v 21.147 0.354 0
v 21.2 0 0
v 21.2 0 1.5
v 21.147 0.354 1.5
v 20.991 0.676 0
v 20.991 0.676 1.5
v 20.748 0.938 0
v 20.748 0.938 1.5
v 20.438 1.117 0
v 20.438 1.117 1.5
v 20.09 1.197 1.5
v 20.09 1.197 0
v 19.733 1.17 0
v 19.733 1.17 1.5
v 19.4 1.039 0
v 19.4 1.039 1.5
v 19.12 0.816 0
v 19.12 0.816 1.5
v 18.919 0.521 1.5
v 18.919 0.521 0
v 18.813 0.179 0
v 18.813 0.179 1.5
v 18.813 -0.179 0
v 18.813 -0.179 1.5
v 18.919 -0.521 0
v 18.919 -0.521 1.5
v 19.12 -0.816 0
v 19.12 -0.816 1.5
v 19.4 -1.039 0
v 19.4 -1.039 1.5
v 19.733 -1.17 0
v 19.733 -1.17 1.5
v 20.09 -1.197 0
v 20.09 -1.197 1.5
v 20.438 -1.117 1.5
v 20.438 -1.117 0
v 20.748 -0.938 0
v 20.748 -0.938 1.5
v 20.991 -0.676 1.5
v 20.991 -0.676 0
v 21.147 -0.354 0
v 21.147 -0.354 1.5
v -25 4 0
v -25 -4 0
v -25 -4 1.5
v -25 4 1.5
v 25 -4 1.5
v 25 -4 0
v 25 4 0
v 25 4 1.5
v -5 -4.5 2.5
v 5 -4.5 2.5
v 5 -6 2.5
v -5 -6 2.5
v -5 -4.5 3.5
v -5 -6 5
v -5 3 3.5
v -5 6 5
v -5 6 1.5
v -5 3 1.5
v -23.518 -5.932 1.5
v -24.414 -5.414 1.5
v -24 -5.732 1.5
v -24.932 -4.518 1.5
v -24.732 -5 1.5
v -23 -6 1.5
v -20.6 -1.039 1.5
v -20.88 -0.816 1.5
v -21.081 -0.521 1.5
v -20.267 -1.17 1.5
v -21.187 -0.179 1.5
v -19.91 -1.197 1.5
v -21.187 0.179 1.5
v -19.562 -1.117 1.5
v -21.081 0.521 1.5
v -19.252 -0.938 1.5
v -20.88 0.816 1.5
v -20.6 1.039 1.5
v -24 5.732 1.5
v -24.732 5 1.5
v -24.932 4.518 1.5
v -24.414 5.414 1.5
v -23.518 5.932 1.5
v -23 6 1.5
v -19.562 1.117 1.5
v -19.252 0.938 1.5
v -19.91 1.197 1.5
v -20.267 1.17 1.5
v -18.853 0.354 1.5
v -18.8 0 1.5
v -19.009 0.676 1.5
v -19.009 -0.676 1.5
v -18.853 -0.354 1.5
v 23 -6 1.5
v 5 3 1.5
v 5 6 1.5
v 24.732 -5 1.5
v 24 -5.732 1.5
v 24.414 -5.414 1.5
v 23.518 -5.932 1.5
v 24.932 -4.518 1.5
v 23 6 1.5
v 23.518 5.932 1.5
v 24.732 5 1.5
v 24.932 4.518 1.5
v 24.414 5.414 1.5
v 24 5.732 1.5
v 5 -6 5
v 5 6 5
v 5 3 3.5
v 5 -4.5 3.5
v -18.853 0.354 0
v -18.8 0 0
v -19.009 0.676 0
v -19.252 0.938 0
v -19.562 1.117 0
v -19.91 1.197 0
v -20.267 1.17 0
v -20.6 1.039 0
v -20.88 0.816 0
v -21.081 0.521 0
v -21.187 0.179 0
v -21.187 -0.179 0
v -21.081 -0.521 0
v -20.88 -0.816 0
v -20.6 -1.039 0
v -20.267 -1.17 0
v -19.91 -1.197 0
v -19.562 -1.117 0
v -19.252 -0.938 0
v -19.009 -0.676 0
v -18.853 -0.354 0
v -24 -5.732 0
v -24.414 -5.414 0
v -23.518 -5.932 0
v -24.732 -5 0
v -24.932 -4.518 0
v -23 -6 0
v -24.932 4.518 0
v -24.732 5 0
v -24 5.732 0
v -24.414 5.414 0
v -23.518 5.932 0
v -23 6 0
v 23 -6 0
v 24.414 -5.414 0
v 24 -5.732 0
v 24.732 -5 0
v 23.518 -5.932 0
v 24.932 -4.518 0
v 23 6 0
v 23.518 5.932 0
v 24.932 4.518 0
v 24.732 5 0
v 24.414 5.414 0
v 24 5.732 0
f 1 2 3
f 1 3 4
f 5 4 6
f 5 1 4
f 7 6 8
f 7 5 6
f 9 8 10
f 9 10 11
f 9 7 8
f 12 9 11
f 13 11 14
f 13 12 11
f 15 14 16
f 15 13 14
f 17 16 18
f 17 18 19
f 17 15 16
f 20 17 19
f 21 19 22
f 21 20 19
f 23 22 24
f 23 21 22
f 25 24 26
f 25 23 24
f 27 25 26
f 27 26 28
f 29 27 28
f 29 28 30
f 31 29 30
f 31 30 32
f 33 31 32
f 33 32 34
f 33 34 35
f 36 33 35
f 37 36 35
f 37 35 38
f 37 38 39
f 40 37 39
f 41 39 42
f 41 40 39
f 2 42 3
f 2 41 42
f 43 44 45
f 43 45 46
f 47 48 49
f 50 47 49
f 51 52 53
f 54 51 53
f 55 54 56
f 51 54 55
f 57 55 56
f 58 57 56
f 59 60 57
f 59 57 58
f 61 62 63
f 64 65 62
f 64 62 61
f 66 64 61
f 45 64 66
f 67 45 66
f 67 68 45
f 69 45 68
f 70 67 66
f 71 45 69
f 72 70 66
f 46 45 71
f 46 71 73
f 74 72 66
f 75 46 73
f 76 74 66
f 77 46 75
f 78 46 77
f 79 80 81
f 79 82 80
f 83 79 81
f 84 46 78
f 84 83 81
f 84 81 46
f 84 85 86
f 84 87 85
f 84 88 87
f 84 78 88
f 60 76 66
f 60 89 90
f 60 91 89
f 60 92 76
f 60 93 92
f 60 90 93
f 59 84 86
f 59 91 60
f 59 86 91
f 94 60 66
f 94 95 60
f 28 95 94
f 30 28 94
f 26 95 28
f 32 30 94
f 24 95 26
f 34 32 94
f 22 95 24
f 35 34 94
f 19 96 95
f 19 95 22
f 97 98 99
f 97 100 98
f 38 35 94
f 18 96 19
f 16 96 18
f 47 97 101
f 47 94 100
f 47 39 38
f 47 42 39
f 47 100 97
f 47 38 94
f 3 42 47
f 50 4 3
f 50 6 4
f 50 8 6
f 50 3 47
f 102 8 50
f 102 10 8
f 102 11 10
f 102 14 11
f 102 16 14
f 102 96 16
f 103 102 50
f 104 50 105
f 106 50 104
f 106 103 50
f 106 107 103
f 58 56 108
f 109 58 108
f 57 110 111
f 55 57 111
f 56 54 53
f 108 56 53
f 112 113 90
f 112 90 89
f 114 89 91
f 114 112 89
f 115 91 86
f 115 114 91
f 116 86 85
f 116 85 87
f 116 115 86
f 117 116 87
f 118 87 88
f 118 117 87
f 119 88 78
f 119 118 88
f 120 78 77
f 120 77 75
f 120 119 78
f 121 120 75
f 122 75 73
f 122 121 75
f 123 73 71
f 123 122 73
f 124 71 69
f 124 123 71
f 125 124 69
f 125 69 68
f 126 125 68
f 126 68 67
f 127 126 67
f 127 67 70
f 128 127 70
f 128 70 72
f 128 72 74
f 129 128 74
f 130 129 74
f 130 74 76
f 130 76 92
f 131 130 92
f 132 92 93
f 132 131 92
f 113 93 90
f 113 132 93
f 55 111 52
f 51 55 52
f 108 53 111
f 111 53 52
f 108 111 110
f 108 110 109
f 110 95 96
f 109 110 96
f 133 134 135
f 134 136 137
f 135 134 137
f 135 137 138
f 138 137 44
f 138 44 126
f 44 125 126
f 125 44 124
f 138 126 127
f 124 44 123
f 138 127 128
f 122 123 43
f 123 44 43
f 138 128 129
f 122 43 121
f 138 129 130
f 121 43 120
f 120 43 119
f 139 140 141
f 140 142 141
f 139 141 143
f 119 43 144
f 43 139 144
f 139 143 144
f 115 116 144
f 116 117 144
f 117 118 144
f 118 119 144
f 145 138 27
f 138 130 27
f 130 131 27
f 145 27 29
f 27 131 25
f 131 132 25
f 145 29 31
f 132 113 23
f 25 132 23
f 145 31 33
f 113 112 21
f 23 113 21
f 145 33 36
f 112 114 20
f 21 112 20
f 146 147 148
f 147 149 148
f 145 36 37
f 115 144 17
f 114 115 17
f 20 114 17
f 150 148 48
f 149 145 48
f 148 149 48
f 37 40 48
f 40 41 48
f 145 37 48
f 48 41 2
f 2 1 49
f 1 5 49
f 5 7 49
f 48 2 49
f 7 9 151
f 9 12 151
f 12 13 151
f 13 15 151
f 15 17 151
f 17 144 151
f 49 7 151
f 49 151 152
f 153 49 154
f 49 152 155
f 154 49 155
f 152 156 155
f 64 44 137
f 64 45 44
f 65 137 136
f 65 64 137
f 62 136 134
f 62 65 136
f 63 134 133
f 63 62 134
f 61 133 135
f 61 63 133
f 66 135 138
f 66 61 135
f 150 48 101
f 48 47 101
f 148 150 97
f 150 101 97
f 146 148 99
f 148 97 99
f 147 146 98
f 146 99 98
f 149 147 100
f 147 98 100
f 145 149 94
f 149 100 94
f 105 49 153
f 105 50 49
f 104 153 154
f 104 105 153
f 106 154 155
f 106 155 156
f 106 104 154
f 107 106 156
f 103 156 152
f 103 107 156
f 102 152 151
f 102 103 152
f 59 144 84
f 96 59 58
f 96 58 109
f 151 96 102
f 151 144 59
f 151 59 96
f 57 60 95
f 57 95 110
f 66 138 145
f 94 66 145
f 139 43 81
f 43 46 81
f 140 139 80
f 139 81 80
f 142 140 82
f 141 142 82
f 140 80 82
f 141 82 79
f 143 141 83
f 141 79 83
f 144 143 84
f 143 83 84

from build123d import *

# Parameters (mm, degrees)
SKETCH_W     = 50
SKETCH_H     = 12
SKETCH_R     = 1.2
PAD_DEPTH    = 1.5
SKETCH001_W  = 10
SKETCH001_H  = 12
PAD001_DEPTH = 3.5
POCKET_DEPTH = 10
FILLET_R     = 2


with BuildPart() as part:
    # Sketch → Pad (new body)
    with BuildSketch(Plane.XY):
        Rectangle(SKETCH_W, SKETCH_H)
        with Locations((-20, 0)):
            Circle(SKETCH_R, mode=Mode.SUBTRACT)
        with Locations((20, 0)):
            Circle(SKETCH_R, mode=Mode.SUBTRACT)
    extrude(amount=PAD_DEPTH)

    # Sketch001 (on Face8 of Pad) → Pad001 (join)
    with BuildSketch(Plane.XY.offset(1.5)):
        Rectangle(SKETCH001_W, SKETCH001_H)
    extrude(amount=PAD001_DEPTH)

    # Sketch002 (on Face12 of Pad001) → Pocket (cut)
    with BuildSketch(Plane.YZ.offset(5)):
        Polygon((3, 1.5), (3, 3.5), (-4.5, 3.5), (-4.5, 2.5), (-6, 2.5), (-6, 1.5), align=None)
    extrude(amount=-POCKET_DEPTH, mode=Mode.SUBTRACT)

    # Fillet
    fillet_edges = [part.edges().sort_by_distance(p)[0] for p in [
        (25, -6, 0.75),
        (25, 6, 0.75),
        (-25, -6, 0.75),
        (-25, 6, 0.75),
    ]]
    fillet(fillet_edges, radius=FILLET_R)


solid = part.part
